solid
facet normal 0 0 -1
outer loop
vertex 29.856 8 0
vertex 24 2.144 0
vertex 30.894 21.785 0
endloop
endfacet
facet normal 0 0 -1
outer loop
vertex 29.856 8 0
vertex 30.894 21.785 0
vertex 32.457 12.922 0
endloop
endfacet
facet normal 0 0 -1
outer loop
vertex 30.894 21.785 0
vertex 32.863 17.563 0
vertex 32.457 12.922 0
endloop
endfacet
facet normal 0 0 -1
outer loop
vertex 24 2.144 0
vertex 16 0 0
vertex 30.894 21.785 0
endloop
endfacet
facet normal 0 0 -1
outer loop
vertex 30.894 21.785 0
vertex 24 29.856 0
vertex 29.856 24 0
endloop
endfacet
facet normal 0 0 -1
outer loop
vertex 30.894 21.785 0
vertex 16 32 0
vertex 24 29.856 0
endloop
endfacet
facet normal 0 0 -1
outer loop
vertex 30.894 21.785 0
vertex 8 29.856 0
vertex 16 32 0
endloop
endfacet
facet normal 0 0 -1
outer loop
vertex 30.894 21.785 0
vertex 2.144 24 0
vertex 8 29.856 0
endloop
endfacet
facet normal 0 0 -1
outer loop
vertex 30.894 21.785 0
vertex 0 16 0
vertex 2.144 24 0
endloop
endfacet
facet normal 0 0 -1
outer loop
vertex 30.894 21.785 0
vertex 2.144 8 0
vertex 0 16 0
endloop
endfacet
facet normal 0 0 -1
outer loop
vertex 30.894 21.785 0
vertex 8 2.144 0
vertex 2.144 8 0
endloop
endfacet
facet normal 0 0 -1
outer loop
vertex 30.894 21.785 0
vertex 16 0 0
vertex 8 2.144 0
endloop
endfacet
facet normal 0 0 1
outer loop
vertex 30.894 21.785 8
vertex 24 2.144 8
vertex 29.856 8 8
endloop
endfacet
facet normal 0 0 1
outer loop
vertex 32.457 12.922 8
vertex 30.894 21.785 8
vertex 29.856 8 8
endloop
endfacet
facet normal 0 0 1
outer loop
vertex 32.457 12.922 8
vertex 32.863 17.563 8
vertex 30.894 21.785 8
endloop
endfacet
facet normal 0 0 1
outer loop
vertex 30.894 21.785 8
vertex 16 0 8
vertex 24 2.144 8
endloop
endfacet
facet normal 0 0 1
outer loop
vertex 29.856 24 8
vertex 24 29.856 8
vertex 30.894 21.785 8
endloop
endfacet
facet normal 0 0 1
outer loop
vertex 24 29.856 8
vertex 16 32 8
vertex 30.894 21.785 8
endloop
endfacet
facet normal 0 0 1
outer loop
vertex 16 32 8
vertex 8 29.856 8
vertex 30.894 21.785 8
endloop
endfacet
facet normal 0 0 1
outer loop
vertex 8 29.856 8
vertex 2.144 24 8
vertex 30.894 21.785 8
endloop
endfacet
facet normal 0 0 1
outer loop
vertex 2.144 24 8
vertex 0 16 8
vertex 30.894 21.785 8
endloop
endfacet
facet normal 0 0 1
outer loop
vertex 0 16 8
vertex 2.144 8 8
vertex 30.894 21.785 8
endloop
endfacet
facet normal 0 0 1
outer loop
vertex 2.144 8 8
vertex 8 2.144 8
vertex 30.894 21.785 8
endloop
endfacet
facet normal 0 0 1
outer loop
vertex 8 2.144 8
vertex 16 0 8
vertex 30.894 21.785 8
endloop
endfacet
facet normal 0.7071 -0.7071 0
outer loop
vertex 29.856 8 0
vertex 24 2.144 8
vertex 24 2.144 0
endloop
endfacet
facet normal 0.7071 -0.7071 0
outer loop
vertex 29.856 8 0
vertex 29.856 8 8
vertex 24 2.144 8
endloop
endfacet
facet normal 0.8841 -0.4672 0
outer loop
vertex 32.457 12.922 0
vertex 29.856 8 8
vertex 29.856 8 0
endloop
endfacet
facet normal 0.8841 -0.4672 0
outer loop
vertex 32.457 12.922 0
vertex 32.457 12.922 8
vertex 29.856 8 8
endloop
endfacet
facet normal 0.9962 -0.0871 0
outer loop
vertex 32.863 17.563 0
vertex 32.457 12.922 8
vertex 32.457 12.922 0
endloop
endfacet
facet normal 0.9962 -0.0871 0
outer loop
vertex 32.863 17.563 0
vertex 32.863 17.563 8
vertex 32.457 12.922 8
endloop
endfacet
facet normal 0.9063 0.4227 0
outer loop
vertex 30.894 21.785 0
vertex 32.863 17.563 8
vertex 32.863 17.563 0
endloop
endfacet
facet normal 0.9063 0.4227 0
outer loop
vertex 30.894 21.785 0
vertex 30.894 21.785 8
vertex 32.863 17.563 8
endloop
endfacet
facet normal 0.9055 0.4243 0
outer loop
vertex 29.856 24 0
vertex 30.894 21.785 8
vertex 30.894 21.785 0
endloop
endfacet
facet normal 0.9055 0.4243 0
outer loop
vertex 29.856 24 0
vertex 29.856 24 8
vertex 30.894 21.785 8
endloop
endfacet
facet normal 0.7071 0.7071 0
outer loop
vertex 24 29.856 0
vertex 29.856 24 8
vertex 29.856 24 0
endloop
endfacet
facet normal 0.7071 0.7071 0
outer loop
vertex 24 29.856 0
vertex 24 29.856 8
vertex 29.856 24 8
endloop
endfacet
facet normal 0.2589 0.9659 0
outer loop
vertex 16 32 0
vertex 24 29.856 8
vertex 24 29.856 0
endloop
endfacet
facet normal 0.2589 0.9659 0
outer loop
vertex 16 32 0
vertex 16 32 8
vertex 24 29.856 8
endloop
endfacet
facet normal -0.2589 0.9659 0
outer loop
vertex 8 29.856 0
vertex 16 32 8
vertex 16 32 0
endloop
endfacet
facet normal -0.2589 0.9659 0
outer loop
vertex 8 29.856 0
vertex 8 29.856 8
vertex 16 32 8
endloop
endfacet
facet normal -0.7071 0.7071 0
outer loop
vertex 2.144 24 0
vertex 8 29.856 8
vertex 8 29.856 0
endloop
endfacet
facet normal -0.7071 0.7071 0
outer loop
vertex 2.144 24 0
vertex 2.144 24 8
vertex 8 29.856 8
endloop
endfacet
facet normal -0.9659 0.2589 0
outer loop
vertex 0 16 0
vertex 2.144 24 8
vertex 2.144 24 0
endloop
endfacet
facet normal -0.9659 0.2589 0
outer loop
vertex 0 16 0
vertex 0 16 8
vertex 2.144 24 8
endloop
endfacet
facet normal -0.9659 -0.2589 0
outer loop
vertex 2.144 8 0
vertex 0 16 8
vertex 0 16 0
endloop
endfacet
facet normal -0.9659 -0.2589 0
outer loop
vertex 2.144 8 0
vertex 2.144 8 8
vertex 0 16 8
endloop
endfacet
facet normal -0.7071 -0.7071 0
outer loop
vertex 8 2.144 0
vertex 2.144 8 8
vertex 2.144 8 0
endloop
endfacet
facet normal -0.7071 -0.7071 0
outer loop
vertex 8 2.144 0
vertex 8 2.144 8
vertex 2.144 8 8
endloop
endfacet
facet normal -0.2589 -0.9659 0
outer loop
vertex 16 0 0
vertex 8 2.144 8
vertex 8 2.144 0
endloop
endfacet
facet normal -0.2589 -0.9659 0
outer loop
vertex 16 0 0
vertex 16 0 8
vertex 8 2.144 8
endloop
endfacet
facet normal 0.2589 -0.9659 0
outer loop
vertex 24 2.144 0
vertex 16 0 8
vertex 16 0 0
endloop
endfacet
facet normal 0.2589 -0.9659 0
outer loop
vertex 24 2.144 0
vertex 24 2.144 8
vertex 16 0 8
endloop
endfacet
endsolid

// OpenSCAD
$fn = 32;

// ----------------------------------------------------------------------
// Eccentric disc: egg, 8 mm thick
// ----------------------------------------------------------------------

// --- parameters (mm) ---
profile_height = 8;       // extrusion height
profile_points = 14;      // points of the closed outline

profile = [[0, 16], [2.144, 8], [8, 2.144], [16, 0], [24, 2.144], [29.856, 8], [32.457, 12.922], [32.863, 17.563], [30.894, 21.785], [29.856, 24], [24, 29.856], [16, 32], [8, 29.856], [2.144, 24]];  // single closed polygon, 14 points, counter clockwise

// --- the one profile operation ---
linear_extrude(height = profile_height) polygon(points = profile);
